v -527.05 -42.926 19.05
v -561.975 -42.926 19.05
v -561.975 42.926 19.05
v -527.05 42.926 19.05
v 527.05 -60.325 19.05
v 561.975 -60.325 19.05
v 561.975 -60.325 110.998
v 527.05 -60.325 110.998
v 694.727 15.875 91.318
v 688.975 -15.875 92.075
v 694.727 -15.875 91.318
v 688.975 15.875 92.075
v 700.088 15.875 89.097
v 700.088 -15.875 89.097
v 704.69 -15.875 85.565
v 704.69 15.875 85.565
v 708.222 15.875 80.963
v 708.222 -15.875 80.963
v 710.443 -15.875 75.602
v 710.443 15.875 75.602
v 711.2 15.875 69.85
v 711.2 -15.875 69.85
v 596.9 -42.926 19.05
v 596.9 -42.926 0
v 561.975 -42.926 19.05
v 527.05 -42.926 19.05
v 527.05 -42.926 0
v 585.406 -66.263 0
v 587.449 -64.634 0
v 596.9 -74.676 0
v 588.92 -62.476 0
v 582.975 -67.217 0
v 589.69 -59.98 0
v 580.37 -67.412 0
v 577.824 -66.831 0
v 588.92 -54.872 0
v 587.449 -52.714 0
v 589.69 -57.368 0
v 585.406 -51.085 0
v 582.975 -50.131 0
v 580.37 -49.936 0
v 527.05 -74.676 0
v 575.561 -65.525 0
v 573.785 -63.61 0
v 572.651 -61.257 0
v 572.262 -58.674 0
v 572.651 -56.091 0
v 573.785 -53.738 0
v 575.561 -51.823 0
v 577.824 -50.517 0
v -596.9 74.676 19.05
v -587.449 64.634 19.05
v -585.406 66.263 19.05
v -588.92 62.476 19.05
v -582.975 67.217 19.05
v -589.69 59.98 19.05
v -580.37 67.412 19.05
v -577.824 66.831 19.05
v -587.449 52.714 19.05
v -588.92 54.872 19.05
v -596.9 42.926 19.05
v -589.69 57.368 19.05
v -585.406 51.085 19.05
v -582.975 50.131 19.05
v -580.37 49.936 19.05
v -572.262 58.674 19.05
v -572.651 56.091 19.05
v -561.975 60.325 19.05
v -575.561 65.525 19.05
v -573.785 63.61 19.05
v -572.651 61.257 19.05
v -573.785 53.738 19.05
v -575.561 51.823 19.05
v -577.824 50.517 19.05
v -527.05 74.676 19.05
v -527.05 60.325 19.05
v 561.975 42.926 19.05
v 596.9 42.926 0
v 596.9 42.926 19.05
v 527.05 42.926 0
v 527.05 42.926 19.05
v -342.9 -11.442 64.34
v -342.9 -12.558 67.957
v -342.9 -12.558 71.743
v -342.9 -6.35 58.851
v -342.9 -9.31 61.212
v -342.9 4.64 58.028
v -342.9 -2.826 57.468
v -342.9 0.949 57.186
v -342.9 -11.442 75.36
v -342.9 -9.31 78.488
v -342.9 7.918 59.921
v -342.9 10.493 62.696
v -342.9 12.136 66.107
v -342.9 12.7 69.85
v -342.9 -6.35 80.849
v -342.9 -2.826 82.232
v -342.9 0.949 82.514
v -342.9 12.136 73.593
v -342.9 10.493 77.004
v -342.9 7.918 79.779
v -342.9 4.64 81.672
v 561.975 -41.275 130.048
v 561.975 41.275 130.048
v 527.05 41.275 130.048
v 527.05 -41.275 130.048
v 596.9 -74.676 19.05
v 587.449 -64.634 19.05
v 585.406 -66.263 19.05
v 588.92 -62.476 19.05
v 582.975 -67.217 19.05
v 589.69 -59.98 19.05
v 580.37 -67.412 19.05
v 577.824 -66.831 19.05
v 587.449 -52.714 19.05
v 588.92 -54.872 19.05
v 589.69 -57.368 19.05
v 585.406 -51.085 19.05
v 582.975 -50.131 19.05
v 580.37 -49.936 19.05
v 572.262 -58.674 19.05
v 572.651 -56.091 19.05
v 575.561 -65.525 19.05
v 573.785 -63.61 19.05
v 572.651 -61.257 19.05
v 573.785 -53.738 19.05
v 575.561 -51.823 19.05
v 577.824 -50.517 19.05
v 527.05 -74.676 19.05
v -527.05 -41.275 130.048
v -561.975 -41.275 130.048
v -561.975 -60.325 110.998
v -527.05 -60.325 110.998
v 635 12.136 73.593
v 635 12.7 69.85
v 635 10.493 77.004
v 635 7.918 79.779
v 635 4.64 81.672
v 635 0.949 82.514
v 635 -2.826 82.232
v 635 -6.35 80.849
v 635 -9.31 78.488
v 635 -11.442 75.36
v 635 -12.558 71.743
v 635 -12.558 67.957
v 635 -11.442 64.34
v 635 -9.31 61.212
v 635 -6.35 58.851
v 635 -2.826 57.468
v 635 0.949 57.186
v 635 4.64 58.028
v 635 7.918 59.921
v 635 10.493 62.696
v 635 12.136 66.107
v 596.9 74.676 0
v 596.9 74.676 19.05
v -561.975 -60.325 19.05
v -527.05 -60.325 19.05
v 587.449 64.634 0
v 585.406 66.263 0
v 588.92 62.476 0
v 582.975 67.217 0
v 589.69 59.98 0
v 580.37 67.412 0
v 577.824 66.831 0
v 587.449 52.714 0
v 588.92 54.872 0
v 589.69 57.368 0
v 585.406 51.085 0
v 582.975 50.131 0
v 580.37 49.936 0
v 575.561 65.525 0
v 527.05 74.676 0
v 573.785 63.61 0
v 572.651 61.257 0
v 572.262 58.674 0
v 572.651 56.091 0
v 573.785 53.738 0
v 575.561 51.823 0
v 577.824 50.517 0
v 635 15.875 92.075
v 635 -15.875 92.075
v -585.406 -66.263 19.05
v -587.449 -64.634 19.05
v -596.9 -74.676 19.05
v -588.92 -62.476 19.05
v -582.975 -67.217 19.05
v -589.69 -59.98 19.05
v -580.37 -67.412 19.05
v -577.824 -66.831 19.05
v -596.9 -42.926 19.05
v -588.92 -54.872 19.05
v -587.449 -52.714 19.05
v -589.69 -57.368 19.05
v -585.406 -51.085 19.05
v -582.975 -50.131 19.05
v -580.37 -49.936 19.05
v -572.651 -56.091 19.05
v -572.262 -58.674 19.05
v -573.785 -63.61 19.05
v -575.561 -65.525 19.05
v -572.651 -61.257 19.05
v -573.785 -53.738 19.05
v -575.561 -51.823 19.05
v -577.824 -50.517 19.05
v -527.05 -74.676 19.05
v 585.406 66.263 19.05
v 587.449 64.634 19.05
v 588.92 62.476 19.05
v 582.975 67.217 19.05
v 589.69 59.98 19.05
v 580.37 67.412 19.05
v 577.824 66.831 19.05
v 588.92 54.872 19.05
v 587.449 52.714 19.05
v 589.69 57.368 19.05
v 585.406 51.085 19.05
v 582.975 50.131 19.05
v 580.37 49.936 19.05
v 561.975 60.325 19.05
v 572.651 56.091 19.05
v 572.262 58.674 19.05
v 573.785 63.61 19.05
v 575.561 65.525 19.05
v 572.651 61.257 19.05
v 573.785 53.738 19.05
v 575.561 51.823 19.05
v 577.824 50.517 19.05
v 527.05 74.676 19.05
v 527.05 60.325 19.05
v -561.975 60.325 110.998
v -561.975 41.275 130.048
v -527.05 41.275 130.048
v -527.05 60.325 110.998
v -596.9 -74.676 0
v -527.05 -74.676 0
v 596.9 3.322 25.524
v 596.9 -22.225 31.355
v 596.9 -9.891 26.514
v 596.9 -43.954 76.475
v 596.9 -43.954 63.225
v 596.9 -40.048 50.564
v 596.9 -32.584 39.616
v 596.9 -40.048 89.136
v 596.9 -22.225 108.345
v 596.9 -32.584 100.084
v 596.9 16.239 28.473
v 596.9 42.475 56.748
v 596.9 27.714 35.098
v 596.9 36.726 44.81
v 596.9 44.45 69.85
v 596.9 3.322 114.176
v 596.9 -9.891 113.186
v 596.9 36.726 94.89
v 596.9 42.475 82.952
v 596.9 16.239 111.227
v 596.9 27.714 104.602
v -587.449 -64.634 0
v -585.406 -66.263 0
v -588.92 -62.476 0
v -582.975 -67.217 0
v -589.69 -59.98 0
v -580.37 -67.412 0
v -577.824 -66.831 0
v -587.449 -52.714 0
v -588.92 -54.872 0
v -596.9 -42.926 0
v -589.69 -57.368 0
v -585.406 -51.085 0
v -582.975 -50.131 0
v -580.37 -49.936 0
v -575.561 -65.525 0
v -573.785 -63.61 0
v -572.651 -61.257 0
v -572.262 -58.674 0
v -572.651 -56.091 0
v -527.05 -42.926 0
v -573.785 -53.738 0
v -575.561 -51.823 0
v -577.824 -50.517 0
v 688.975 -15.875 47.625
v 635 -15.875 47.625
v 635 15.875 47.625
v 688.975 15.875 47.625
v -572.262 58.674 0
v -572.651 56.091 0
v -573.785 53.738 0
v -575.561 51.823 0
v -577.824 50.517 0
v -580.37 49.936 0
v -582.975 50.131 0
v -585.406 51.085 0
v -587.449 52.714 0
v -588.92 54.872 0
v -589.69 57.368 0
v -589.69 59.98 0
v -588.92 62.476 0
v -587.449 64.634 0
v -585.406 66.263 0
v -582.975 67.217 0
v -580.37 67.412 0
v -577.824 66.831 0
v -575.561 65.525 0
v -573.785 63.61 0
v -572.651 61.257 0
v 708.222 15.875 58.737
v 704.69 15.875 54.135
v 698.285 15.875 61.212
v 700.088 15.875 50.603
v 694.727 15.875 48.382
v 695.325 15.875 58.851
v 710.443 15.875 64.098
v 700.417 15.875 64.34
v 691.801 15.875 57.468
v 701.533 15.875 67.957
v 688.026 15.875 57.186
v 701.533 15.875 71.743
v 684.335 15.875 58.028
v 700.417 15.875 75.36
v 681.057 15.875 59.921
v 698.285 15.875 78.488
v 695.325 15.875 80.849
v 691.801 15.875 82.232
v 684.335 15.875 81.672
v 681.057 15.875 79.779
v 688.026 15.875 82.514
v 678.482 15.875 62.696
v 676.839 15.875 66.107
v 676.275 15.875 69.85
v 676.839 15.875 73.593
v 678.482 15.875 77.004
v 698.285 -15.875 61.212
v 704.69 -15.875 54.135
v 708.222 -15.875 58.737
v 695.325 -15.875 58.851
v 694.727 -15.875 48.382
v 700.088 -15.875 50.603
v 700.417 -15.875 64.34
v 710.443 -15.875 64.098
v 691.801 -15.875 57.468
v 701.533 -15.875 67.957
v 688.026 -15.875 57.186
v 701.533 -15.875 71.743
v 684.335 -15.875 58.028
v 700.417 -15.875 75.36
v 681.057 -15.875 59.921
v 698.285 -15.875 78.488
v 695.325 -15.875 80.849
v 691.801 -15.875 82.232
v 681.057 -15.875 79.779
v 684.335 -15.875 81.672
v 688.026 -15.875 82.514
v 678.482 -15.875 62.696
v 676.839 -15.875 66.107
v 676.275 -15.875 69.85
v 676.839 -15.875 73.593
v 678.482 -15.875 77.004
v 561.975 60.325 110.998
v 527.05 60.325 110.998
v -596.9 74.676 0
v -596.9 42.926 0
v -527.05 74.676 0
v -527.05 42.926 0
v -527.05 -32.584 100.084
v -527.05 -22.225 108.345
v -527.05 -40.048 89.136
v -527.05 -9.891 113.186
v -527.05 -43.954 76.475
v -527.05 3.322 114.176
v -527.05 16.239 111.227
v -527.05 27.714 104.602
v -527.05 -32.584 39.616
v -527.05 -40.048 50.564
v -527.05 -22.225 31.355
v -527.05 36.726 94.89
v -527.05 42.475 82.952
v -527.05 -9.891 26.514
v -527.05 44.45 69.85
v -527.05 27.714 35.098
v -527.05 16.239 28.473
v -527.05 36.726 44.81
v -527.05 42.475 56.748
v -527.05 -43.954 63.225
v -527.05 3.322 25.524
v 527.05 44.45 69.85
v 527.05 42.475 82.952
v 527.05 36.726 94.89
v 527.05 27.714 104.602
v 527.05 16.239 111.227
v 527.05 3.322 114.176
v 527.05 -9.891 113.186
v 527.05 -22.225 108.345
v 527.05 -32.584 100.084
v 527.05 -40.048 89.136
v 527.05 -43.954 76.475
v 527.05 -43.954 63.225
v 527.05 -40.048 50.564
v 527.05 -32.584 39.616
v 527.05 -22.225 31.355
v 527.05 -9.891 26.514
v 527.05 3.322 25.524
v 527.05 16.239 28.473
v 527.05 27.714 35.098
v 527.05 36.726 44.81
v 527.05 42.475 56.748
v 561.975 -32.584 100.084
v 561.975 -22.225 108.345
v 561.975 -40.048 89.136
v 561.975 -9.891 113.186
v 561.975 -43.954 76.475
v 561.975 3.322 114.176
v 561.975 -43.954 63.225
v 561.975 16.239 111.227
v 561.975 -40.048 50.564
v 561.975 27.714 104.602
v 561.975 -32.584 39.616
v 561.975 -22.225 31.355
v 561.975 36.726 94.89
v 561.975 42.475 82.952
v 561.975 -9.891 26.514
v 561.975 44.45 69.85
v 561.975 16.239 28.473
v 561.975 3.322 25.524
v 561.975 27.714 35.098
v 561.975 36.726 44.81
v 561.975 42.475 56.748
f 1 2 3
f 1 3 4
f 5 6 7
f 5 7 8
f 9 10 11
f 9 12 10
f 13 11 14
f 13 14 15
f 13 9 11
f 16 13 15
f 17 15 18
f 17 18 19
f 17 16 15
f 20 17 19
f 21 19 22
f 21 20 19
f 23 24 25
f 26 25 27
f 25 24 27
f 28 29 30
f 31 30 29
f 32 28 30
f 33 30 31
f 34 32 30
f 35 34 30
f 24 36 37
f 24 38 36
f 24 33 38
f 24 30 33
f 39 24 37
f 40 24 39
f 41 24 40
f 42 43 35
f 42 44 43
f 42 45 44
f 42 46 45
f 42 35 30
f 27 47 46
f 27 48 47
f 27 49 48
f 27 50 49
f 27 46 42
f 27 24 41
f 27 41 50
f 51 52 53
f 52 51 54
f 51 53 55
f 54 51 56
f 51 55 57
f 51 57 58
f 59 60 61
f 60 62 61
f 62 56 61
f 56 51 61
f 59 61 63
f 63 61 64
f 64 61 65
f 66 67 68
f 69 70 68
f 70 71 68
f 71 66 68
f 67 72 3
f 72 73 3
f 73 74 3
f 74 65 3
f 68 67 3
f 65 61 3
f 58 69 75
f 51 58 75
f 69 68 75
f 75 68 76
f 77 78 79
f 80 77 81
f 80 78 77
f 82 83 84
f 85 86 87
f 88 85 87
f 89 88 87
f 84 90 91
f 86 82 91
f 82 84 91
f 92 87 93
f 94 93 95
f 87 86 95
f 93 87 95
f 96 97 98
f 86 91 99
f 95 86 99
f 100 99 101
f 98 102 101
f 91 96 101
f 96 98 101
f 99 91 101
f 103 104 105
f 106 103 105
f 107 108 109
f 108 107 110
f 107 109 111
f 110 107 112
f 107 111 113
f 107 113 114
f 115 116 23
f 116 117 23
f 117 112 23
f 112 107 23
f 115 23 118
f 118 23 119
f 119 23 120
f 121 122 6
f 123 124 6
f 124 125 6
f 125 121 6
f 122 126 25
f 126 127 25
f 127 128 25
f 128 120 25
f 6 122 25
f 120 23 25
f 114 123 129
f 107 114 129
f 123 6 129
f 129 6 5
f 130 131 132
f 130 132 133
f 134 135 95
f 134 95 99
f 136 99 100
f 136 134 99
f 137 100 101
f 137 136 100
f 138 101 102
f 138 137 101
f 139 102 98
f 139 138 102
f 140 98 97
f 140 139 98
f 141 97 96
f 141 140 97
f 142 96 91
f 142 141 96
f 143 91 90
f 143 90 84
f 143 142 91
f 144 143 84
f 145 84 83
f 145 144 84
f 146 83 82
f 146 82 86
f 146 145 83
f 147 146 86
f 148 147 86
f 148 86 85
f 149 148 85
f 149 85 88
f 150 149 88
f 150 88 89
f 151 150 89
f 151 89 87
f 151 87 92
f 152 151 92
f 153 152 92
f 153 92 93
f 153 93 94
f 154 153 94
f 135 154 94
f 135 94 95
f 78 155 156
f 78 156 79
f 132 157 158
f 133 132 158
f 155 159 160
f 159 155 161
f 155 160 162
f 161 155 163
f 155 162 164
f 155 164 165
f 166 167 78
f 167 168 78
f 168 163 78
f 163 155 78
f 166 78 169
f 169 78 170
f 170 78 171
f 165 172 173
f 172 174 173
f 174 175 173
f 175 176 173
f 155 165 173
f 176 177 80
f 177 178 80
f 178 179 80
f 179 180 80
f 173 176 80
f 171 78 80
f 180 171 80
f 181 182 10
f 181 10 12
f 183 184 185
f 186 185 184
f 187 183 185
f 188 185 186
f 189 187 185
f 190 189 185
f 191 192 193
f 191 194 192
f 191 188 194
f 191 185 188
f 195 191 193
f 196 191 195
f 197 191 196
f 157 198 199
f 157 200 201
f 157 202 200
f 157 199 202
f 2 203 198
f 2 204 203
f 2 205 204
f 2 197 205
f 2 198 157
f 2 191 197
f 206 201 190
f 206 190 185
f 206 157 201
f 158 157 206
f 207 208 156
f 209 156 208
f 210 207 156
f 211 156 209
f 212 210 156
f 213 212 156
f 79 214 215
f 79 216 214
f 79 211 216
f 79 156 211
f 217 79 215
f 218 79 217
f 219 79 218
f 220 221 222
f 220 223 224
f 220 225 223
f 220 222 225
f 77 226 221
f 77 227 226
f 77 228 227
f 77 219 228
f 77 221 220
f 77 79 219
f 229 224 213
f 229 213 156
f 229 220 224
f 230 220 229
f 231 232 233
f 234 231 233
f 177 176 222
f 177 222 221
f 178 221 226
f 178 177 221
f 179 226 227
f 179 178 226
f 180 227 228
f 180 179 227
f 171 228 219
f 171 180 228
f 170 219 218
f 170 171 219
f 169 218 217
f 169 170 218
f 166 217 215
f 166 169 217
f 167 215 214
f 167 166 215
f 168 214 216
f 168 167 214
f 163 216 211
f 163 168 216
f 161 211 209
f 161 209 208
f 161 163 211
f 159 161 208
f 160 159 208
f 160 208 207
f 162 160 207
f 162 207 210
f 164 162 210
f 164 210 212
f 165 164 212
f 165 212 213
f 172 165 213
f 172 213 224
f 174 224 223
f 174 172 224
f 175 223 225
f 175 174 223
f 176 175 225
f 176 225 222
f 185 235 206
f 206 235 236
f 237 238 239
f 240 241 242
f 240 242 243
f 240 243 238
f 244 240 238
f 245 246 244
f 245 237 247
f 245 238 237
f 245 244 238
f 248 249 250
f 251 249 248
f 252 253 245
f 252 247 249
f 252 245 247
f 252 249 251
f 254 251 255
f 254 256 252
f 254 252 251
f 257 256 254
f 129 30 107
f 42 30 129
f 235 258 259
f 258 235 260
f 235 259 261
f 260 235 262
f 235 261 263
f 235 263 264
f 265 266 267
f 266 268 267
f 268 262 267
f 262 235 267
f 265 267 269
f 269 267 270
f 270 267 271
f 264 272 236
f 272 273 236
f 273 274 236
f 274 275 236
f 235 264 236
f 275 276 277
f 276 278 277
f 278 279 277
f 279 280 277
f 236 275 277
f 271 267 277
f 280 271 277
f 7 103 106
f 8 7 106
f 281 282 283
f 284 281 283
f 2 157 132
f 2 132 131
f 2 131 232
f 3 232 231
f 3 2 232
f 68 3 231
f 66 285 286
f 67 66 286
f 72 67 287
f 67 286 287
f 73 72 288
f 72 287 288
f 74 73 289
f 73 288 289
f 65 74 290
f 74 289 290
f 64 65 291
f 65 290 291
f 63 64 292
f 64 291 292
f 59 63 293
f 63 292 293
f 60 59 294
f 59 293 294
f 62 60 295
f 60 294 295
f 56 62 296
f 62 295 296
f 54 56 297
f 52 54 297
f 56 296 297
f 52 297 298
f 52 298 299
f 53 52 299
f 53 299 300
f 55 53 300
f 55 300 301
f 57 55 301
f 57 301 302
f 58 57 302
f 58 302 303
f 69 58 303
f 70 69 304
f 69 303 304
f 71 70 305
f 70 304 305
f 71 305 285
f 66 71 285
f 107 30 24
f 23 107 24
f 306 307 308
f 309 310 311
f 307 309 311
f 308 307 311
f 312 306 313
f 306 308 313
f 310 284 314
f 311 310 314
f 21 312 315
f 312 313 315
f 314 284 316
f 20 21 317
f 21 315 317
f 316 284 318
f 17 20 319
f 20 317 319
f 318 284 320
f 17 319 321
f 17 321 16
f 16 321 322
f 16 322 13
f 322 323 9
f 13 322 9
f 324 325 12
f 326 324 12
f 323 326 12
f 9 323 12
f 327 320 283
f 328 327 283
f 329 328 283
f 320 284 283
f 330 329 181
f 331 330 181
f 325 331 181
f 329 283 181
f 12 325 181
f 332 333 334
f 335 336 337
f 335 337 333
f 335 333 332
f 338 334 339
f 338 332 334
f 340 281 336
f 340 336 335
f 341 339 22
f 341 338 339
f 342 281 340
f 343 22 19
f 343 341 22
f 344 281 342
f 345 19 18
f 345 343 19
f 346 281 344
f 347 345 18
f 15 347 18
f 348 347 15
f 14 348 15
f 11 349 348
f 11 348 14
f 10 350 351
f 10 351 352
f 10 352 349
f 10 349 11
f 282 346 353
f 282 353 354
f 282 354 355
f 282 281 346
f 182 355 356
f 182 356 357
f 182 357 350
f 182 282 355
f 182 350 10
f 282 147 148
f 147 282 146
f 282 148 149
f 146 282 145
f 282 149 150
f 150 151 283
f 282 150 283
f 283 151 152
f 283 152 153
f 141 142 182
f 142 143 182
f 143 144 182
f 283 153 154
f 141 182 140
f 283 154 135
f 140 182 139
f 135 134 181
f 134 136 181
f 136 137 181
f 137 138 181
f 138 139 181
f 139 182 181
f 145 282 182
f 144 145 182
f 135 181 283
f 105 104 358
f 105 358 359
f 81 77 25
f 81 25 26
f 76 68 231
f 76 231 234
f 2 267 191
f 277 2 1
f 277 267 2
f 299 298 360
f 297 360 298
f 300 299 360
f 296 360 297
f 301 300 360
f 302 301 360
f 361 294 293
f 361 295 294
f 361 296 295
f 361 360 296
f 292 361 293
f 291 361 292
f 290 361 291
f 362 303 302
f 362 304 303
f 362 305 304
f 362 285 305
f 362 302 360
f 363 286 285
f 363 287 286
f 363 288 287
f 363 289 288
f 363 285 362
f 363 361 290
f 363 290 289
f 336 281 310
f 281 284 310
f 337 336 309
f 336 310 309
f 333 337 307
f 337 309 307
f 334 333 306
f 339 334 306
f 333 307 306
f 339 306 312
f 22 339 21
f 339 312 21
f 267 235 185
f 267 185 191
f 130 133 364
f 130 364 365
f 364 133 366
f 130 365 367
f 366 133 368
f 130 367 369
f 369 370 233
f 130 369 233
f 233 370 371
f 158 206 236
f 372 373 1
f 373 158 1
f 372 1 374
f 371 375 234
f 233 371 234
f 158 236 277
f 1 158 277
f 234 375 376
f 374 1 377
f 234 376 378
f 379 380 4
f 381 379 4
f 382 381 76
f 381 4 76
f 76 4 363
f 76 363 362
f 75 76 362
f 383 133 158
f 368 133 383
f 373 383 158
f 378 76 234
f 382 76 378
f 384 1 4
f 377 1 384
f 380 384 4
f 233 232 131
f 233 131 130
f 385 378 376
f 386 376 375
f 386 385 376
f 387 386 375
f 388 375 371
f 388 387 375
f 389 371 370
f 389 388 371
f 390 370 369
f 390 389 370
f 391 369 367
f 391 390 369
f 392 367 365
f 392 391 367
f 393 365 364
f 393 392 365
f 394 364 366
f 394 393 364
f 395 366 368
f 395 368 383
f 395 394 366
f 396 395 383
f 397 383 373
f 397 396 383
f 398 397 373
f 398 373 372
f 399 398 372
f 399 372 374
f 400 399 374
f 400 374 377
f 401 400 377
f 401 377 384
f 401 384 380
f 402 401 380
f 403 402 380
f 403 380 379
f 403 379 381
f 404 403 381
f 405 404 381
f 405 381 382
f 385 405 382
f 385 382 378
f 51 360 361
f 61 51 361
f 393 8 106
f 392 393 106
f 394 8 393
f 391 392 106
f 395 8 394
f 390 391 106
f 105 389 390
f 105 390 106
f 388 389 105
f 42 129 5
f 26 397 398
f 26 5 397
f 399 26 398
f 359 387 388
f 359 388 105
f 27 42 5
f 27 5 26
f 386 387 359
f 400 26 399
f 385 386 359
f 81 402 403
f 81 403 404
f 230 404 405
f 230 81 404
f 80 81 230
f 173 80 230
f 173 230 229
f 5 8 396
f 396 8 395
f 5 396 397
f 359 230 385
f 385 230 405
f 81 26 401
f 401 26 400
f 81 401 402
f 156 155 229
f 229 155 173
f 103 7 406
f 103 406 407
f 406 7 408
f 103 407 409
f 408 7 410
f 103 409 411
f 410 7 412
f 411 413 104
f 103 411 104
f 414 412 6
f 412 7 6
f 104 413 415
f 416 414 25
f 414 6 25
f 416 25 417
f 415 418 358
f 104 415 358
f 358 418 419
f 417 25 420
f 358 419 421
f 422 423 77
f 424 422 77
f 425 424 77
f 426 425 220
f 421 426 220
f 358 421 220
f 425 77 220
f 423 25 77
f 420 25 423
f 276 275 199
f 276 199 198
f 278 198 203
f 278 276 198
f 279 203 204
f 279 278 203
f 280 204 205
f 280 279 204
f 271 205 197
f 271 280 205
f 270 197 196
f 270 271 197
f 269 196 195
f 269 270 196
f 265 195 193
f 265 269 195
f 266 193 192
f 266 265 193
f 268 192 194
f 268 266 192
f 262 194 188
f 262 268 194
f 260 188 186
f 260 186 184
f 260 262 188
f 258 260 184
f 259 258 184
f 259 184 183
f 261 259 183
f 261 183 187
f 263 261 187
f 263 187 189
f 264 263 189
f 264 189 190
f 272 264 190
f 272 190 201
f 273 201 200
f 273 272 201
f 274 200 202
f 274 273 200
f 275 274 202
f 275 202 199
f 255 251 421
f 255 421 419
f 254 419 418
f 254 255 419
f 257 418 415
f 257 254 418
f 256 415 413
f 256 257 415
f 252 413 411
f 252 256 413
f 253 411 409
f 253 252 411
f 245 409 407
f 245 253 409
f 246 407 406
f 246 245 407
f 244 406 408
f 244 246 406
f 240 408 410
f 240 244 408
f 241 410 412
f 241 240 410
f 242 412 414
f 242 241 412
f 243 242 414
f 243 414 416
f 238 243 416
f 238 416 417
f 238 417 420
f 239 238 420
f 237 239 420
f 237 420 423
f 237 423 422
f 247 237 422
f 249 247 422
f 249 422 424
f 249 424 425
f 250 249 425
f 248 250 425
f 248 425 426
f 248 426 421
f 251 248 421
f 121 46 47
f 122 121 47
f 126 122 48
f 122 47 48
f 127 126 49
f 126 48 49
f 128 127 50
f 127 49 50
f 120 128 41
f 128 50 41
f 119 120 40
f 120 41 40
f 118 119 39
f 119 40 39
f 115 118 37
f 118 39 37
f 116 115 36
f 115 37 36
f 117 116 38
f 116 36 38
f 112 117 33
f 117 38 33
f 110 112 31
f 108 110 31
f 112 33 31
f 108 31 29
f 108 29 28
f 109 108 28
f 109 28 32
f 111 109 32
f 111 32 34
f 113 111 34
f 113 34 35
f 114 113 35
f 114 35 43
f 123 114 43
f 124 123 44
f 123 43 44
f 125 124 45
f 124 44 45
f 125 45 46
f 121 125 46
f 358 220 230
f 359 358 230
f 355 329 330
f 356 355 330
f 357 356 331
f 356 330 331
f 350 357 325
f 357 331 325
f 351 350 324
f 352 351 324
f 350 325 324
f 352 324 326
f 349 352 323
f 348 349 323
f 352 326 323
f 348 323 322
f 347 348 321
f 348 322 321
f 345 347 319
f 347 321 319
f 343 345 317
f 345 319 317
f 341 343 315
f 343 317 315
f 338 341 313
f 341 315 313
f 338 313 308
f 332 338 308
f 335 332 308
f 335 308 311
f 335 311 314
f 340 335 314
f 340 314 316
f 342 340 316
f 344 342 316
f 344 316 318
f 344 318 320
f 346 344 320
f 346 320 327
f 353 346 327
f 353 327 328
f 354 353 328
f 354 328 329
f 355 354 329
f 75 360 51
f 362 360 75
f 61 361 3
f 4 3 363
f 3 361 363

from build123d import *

# Parameters (mm, degrees)
F0_W      = 69.85
F0_H      = 31.75
F0_R      = 8.763
F1_DEPTH  = 19.05
F3_W      = 34.925
F3_H      = 120.65
F4_DEPTH  = 110.998
F5_SIZE   = 19.05
F8_R      = 44.45
F9_DEPTH  = 1123.95
F11_R     = 12.7
F12_DEPTH = 1016
F14_W     = 31.75
F14_H     = 44.45
F15_DEPTH = 76.2
F16_R     = 22.22499
F18_D     = 25.4


# Not quite as in the source:
# - a fillet or chamfer is up to 0.001 mm smaller than in the source, because OpenCascade refuses the exact size


with BuildPart() as f1:
    # F0 (on Top) → F1 (new body)
    with BuildSketch(Plane.XY):
        with Locations((-561.975, -58.801)):
            Rectangle(F0_W, F0_H)
        with Locations((-581.025, -58.674)):
            Circle(F0_R, mode=Mode.SUBTRACT)
    extrude(amount=F1_DEPTH)


with BuildPart() as f2_1:
    # F2: instance of F1
    add(f1.part.mirror(Plane.XZ))


with BuildPart() as f1_1:
    add(f1.part)

    add(f2_1.part)  # F4 merges F2_1
    # F3 (on face) → F4 (join)
    with BuildSketch(Plane.XY.offset(19.05)):
        with Locations((-544.5125, 0)):
            Rectangle(F3_W, F3_H)
    extrude(amount=F4_DEPTH)

    # F5
    f5_edges = [f1_1.edges().sort_by_distance(p)[0] for p in [
        (-544.5125, 60.325, 130.048),
        (-544.5125, -60.325, 130.048),
    ]]
    chamfer(f5_edges, length=F5_SIZE)

    # F6: union 


with BuildPart() as f7_1:
    # F7: instance of F1
    add(f1_1.part.mirror(Plane.YZ))


with BuildPart() as f1_2:
    add(f1_1.part)

    add(f7_1.part)  # F9 merges F7_1
    # F8 (on face) → F9 (join, through all)
    with BuildSketch(Plane.YZ.offset(596.9)):
        with Locations((0, 69.85)):
            Circle(F8_R)
    extrude(amount=-F9_DEPTH)


with BuildPart() as f12:
    # F11 (on offset) → F12 (new body)
    with BuildSketch(Plane.YZ.offset(673.1)):
        with Locations((0, 69.85)):
            Circle(F11_R)
    extrude(amount=-F12_DEPTH)

    # F14 (on offset) → F15 (join)
    with BuildSketch(Plane.YZ.offset(635)):
        with Locations((0, 69.85)):
            Rectangle(F14_W, F14_H)
    extrude(amount=F15_DEPTH)

    # F16 (radius 22.225 in the source; OpenCascade refuses exactly that, so slightly less here)
    f16_edges = [f12.edges().sort_by_distance(p)[0] for p in [
        (711.2, 0, 92.075),
        (711.2, 0, 47.625),
    ]]
    fillet(f16_edges, radius=F16_R)

    # F18 (through all)
    with Locations(Plane.XZ.offset(15.875)):
        with Locations((688.975, 69.85)):
            Hole(F18_D / 2)


solid = Compound([f1_2.part, f12.part])
